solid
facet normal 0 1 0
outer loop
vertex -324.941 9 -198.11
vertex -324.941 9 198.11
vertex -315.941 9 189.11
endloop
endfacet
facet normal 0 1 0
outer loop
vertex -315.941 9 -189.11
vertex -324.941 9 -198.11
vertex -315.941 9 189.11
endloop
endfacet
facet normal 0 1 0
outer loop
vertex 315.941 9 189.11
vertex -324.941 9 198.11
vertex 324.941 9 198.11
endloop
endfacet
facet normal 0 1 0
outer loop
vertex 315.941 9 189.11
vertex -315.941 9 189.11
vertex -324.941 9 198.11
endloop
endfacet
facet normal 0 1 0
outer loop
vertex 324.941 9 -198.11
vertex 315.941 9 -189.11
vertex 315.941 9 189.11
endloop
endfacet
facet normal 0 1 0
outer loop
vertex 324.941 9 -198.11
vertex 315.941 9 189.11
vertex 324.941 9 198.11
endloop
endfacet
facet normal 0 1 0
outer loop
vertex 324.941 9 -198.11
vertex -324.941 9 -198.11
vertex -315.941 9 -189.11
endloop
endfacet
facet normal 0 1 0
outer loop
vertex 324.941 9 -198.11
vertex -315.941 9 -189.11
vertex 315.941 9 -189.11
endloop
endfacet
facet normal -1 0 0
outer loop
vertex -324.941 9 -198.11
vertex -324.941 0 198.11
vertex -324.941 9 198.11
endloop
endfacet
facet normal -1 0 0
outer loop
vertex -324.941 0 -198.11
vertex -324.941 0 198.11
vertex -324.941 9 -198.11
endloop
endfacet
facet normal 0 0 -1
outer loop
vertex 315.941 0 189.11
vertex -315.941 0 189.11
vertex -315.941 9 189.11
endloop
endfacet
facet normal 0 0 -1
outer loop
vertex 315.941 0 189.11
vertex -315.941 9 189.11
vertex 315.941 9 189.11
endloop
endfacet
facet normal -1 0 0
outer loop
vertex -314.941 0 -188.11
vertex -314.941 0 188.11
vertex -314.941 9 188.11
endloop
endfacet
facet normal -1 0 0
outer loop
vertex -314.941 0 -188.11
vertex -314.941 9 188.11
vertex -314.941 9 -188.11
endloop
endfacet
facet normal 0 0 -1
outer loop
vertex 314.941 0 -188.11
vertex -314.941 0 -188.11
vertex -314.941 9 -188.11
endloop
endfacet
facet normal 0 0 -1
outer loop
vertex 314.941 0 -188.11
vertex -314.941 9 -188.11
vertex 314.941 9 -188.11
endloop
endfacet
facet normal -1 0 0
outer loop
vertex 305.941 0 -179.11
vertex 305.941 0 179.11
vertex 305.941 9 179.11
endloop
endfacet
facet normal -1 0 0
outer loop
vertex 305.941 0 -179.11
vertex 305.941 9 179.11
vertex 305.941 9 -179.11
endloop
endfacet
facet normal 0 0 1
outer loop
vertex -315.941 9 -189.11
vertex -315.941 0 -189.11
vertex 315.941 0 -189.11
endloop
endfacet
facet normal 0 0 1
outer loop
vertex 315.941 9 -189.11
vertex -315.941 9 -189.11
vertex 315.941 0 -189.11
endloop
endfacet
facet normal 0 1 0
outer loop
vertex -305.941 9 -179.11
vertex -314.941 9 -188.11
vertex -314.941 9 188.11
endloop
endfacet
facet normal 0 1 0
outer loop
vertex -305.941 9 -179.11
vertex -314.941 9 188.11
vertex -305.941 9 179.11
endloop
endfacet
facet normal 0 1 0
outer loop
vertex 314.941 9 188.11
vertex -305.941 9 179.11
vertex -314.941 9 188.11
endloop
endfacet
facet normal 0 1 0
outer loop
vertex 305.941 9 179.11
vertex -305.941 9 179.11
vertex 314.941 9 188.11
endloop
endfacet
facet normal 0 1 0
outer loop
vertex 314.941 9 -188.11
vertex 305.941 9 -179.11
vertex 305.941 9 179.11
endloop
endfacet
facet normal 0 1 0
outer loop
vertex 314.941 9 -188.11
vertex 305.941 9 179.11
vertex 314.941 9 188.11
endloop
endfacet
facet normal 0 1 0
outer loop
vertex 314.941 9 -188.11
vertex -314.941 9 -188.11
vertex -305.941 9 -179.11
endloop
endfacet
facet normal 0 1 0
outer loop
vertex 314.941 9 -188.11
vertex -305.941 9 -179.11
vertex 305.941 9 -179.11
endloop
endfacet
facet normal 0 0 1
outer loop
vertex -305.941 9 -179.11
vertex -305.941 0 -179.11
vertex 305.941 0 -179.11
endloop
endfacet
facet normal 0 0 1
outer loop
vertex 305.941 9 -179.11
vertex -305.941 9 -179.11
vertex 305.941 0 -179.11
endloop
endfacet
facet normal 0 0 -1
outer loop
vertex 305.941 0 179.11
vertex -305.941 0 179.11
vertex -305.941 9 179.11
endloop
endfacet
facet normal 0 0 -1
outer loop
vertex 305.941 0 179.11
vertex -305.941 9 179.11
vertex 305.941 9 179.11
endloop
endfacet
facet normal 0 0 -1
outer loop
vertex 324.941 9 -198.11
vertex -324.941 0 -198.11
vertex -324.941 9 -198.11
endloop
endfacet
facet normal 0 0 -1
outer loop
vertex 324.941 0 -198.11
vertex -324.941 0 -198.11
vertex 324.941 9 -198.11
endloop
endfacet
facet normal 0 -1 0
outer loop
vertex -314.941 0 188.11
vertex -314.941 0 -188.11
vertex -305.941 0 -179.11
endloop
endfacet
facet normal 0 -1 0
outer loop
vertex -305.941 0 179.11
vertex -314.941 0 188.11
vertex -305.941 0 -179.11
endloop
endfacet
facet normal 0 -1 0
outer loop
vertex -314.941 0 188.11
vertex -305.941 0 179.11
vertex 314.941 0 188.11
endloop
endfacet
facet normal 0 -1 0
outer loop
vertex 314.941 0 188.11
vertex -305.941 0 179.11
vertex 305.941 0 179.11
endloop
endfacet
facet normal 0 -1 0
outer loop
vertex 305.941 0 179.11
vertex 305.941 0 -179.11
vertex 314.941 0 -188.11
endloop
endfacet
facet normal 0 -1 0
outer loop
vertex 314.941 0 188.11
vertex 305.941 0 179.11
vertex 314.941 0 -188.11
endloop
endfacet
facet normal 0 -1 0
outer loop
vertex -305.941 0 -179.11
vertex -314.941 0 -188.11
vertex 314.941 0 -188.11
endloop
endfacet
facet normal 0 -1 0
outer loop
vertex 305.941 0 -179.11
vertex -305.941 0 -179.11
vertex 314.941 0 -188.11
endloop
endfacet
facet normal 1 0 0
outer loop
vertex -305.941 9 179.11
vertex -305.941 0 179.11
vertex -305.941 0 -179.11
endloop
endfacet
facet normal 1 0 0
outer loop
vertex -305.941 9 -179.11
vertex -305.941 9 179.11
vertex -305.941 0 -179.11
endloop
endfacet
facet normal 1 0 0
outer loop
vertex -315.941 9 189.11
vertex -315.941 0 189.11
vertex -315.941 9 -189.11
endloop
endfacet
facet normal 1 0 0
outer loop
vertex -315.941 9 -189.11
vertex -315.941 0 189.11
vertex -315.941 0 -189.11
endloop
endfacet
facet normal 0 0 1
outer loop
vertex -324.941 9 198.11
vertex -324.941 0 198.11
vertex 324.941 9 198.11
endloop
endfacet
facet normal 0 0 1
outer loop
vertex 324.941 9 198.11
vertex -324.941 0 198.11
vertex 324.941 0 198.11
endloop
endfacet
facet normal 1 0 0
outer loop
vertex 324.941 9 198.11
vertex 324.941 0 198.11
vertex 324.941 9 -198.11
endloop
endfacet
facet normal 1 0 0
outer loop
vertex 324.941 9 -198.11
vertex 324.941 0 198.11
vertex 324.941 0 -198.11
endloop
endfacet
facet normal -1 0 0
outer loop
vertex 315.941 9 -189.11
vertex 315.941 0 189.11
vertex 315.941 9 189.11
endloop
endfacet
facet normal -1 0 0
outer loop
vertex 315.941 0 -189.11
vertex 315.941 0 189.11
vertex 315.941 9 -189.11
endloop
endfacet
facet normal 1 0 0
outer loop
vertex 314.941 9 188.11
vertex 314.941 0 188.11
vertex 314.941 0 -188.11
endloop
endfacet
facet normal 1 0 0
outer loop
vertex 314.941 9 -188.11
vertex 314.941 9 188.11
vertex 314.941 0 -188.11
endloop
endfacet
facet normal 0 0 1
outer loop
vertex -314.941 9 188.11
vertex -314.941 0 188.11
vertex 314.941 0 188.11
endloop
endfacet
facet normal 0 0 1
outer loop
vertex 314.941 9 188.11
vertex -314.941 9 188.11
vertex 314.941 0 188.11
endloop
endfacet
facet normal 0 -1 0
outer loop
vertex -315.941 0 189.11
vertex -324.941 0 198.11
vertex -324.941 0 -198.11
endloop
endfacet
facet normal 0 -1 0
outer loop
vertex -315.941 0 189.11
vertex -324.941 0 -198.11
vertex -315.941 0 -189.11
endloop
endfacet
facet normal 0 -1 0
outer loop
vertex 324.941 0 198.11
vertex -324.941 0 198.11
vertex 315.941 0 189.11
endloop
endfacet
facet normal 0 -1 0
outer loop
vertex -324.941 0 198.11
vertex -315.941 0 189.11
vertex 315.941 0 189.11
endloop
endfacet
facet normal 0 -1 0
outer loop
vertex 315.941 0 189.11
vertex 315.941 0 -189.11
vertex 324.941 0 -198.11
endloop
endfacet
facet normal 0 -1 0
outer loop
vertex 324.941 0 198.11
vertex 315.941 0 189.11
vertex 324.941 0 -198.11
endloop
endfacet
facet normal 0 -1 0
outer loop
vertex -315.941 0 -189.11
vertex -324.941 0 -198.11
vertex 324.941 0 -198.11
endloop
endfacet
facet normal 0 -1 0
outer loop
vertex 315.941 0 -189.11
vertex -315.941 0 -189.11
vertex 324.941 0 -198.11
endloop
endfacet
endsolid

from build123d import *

# Parameters (mm, degrees)
SKETCH6_W             = 629.882620812
SKETCH6_H             = 376.220667898
SKETCH6_W_2           = 611.882620812
SKETCH6_H_2           = 358.220667898
BOSS_EXTRUDE3_DEPTH   = 9
SKETCH6_W_3           = 649.882620812
SKETCH6_H_3           = 396.220667898
SKETCH6_W_4           = 631.882620812
SKETCH6_H_4           = 378.220667898
BOSS_EXTRUDE3_2_DEPTH = 9


with BuildPart() as part:
    # Sketch6 → Boss-Extrude3 (new body)
    with BuildSketch(Plane(origin=(0, 0, 0), x_dir=(1, 0, 0), z_dir=(0, 1, 0))):
        Rectangle(SKETCH6_W, SKETCH6_H)
        Rectangle(SKETCH6_W_2, SKETCH6_H_2, mode=Mode.SUBTRACT)
    extrude(amount=BOSS_EXTRUDE3_DEPTH)


with BuildPart() as body_2:
    # Sketch6 → Boss-Extrude3 2 (new body)
    with BuildSketch(Plane(origin=(0, 0, 0), x_dir=(1, 0, 0), z_dir=(0, 1, 0))):
        Rectangle(SKETCH6_W_3, SKETCH6_H_3)
        Rectangle(SKETCH6_W_4, SKETCH6_H_4, mode=Mode.SUBTRACT)
    extrude(amount=BOSS_EXTRUDE3_2_DEPTH)


solid = Compound([part.part, body_2.part])
